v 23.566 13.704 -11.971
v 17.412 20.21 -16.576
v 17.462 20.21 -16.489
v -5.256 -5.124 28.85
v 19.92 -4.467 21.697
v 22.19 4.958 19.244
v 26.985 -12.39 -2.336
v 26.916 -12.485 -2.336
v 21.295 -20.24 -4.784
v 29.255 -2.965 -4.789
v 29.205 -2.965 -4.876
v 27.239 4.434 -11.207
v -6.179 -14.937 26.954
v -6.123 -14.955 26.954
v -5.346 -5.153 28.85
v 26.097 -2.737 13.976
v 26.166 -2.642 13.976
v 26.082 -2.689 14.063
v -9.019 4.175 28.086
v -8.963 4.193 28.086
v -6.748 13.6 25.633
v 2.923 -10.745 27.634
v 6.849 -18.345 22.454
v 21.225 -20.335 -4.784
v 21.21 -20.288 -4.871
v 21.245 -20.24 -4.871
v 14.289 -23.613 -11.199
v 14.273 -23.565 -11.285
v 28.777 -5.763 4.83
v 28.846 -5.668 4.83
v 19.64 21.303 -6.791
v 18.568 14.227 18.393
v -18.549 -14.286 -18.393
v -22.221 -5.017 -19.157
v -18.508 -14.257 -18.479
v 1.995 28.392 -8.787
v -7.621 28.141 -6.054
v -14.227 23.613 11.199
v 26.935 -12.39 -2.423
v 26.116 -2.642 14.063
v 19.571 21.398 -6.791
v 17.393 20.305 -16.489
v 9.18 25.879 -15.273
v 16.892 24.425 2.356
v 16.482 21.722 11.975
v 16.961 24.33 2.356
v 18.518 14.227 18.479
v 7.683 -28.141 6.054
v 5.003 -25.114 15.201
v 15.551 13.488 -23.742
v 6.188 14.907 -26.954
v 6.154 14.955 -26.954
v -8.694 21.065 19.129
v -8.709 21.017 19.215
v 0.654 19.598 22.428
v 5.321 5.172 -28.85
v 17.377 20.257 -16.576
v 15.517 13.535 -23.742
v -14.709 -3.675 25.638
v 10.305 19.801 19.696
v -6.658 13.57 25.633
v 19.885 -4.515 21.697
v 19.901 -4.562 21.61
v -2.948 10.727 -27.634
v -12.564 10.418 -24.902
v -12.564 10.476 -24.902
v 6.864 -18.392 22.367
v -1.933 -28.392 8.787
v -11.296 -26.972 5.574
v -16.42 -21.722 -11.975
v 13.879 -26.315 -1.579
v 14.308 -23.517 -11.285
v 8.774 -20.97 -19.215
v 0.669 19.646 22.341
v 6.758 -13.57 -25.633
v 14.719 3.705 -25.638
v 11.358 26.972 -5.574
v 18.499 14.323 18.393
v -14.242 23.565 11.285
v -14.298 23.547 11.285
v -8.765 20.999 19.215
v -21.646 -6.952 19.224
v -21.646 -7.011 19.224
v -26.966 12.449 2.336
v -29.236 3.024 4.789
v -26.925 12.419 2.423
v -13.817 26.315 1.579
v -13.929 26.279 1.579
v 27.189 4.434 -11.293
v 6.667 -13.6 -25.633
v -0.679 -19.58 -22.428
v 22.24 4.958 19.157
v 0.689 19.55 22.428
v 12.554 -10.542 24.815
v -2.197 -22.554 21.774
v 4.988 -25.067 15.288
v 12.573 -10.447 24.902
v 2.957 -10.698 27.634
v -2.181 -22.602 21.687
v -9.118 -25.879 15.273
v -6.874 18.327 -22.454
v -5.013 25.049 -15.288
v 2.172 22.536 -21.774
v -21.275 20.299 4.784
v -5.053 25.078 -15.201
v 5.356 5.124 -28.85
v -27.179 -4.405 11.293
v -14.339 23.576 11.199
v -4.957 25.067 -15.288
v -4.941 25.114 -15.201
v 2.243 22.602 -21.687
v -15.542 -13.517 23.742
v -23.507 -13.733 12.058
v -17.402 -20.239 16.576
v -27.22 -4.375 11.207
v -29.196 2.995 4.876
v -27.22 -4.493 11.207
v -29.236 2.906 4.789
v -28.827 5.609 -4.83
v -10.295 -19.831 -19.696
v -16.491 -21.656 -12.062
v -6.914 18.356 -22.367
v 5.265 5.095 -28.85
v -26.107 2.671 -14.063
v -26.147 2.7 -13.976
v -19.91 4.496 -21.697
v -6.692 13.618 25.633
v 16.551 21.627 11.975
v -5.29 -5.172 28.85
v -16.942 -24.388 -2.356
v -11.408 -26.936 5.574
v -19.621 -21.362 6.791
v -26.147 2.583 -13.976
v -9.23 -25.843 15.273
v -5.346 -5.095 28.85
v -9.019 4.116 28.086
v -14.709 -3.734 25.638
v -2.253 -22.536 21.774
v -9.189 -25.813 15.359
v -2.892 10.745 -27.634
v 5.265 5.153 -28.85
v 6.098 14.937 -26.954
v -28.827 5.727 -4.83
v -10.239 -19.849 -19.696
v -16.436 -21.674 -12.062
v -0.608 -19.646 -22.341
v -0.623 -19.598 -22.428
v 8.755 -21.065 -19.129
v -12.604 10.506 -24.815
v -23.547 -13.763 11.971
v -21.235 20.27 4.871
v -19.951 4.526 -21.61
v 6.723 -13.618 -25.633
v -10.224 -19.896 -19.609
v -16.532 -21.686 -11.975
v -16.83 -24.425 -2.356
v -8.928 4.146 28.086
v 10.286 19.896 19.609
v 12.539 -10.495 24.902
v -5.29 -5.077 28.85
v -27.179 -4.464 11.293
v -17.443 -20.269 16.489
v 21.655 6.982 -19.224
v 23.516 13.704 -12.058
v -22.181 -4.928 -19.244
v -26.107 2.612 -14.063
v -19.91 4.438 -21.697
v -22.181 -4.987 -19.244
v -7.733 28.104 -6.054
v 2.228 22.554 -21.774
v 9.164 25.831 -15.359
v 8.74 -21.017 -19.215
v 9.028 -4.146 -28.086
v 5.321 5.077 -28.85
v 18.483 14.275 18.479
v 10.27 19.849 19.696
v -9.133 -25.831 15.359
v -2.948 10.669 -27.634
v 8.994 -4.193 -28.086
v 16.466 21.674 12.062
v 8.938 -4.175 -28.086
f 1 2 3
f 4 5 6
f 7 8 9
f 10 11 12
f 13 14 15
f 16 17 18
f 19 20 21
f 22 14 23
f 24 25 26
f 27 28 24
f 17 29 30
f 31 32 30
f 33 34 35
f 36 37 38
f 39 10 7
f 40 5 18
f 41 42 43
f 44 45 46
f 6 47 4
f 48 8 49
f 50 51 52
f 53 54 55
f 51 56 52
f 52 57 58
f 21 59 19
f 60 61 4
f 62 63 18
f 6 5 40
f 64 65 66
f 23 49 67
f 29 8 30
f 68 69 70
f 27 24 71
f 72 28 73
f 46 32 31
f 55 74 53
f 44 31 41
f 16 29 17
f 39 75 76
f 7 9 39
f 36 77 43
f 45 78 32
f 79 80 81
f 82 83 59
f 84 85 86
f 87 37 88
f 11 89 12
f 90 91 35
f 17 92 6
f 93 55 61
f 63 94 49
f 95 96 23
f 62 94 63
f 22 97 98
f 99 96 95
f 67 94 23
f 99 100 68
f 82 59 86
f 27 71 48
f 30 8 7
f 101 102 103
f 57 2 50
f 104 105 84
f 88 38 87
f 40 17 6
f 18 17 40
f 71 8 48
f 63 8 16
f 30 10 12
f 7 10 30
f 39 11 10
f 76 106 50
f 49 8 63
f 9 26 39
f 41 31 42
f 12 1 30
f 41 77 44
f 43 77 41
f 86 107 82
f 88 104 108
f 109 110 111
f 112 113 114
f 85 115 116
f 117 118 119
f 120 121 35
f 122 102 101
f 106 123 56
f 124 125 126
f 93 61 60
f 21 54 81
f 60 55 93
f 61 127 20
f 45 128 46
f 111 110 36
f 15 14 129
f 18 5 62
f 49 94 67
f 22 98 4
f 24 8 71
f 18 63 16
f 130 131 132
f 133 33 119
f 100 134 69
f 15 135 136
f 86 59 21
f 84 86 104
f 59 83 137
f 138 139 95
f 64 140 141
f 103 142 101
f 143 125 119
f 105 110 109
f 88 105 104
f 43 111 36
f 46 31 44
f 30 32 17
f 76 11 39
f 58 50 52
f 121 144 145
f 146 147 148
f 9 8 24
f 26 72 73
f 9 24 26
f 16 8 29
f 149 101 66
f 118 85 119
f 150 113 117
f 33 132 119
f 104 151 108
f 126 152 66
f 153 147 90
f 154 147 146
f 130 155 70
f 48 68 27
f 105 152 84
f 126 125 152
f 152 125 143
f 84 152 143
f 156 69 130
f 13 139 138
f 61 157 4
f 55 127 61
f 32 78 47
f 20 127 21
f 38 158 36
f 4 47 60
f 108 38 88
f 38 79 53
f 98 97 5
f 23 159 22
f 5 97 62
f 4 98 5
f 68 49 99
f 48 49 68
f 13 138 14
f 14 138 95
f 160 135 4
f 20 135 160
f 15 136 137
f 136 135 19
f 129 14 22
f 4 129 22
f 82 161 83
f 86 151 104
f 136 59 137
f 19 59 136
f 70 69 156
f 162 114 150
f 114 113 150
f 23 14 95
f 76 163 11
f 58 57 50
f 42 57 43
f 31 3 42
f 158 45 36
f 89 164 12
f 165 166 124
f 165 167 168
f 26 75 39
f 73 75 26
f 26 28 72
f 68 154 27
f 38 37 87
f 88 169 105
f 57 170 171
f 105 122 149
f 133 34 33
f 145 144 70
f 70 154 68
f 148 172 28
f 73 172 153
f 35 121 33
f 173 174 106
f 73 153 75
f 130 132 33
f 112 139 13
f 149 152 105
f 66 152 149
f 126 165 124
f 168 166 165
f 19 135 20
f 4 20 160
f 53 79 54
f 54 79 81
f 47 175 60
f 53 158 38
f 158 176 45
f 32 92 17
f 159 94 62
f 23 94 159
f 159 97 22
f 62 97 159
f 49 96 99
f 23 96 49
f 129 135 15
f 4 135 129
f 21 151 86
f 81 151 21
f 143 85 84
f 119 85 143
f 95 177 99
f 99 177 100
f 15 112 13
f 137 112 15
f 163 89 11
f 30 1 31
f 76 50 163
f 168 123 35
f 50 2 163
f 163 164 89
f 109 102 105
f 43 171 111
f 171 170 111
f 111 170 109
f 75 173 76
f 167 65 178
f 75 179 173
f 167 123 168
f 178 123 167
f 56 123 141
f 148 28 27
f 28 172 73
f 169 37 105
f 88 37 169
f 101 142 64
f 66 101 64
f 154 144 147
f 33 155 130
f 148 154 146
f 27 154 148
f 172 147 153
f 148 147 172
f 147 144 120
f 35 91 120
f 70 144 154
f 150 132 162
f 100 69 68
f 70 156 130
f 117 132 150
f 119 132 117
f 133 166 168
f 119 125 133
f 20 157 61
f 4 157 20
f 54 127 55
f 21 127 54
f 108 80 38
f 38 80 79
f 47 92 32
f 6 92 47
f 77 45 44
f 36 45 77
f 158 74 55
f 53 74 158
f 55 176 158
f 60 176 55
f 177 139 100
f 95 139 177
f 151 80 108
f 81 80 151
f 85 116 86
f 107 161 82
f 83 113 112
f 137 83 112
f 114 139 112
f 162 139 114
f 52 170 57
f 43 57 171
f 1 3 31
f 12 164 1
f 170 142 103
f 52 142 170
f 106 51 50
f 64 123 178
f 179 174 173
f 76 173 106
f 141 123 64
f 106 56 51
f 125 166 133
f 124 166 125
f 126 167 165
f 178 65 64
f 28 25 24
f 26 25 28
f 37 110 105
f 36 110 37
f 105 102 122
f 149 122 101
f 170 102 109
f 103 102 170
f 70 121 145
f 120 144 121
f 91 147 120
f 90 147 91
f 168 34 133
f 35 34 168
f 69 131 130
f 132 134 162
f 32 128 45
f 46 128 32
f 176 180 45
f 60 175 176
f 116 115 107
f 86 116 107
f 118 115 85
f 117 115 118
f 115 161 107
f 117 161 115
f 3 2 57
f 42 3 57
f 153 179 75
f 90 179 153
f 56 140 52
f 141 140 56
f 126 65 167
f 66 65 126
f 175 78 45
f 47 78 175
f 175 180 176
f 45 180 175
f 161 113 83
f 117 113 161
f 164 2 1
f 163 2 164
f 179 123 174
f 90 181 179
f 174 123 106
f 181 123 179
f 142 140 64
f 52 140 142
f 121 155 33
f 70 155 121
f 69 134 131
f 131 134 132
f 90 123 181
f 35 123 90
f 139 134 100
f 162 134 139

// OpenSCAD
// Auto-generated OpenSCAD file

    inner_points = 10*[[-1.6451036775652808, -2.1626836934703126, -1.1975226886664396], [1.686072709471346, 2.432955782684813, 0.2356107715886286], [-1.6860727094713472, -2.4329557826848114, -0.2356107715886286], [1.6451036775652794, 2.1626836934703144, 1.1975226886664396], [-2.6884846067758437, 1.2389917062429145, 0.233618340039301], [-2.1194517463573437, 2.0240206487946675, 0.47842676129971456], [2.119451746357343, -2.0240206487946657, -0.47842676129971456], [2.6884846067758428, -1.2389917062429128, -0.233618340039301], [-0.2907283441631142, 1.0697947112799653, -2.7547493104508978], [-0.5305652343997654, -0.5124056576130412, 2.8763811346733195], [0.5305652343997641, 0.5124056576130432, -2.8763811346733195], [0.2907283441631129, -1.0697947112799635, 2.7547493104508978], [-1.8467649995645183, -1.4227471690324143, -1.839259902027394], [1.1327297390179003, 2.68771773847334, -0.5574263668434638], [-1.95402331758078, -2.130328684806416, 0.6790581910658857], [1.0254714210016385, 1.9801362226993382, 1.9608917262498158], [-1.0254714210016398, -1.9801362226993364, -1.9608917262498158], [1.9540233175807786, 2.130328684806418, -0.6790581910658857], [-1.1327297390179016, -2.687717738473338, 0.5574263668434638], [1.846764999564517, 1.422747169032416, 1.839259902027394], [-2.87456367211222, 0.5667833051879534, -0.4829780924069351], [-1.3848163028210105, 2.6220157589408304, 0.15793867518503008], [-2.915532704018286, 0.2965112159734543, 0.47893382467087603], [-1.425785334727077, 2.351743669726331, 1.1198505922628412], [1.4257853347270757, -2.3517436697263294, -1.1198505922628412], [2.9155327040182852, -0.2965112159734523, -0.47893382467087603], [1.3848163028210092, -2.6220157589408286, -0.15793867518503008], [2.874563672112219, -0.5667833051879514, 0.4829780924069351], [-1.2523453639028133, 1.0446987882266965, -2.48150417875951], [-0.6833125034843128, 1.8297277307784492, -2.2366957574990964], [-1.4668619999353363, -0.3704642433213059, 2.5551320074270496], [-0.8978291395168357, 0.4145646992304467, 2.799940428687463], [0.8978291395168344, -0.4145646992304447, -2.799940428687463], [1.466861999935335, 0.3704642433213079, -2.5551320074270496], [0.6833125034843115, -1.8297277307784474, 2.2366957574990964], [1.252345363902812, -1.0446987882266947, 2.48150417875951], [-2.214028904681588, -0.49577681218892655, -1.9157006080132506], [0.1964329734823296, 2.829659152765075, -0.8786754940897339], [-2.3466074769019785, -1.370395665307932, 1.197111744017687], [0.06385440126193956, 1.9550402996460696, 2.2341368579412038], [-0.06385440126194084, -1.9550402996460678, -2.2341368579412038], [2.3466074769019776, 1.3703956653079339, -1.197111744017687], [-0.19643297348233088, -2.8296591527650734, 0.8786754940897339], [2.2140289046815873, 0.49577681218892855, 1.9157006080132506], [-2.606613064002787, 0.2641562073095579, -1.3976470550614495], [-0.7651840462573698, 2.8045632297118064, -0.6054303623983461], [-2.7138713820190485, -0.44342530846444383, 1.1206710380318305], [-0.8724423642736312, 2.096981713937805, 1.9128877306949337], [0.8724423642736299, -2.096981713937803, -1.9128877306949337], [2.7138713820190477, 0.44342530846444583, -1.1206710380318305], [0.7651840462573685, -2.8045632297118046, 0.6054303623983461], [2.606613064002786, -0.2641562073095559, 1.3976470550614495], [-1.9869808074391464, 0.4467036780805339, -2.161016092644826], [-0.4972334381479373, 2.5019361318334106, -1.5200993250528605], [-2.1605284115656027, -0.6981872642529703, 1.913708176463923], [-0.6707810422743935, 1.3570451894999065, 2.554624944055888], [0.6707810422743922, -1.3570451894999047, -2.554624944055888], [2.160528411565602, 0.6981872642529723, -1.913708176463923], [0.49723343814793597, -2.501936131833409, 1.5200993250528605], [1.986980807439145, -0.4467036780805319, 2.161016092644826], [-1.5501088369047502, -1.3487833733431578, 2.36549645177391], [0.22122791204797956, 2.2506578071333787, -2.1686920260683786], [-0.22122791204798084, -2.250657807133377, 2.1686920260683786], [1.5501088369047489, 1.3487833733431596, -2.36549645177391], [-1.7361879022411257, -2.020991774398119, 1.648900019327674], [0.914894323678246, 2.578380828065043, -1.5272681951052522], [-0.9148943236782473, -2.578380828065041, 1.5272681951052522], [1.7361879022411244, 2.0209917743981207, -1.648900019327674], [-0.6138120713691793, -1.490724787634893, 2.6867455790201804], [0.6138120713691779, 1.4907247876348948, -2.6867455790201804]];

    outer_points = 10*[[-0.8127781095257554, -2.8451711072731785, 0.24903929976162134], [-0.13633829193286426, 2.9660232971458376, 0.04177473821664251], [0.13633829193286426, -2.9660232971458376, -0.04177473821664251], [0.8127781095257554, 2.8451711072731785, -0.24903929976162134], [0.7997377853601801, -0.49633525670734463, 2.816327084240848], [0.9152875010113133, 0.49633525670734463, 2.7809220703309587], [-0.9152875010113133, -0.49633525670734463, -2.7809220703309587], [-0.7997377853601801, 0.49633525670734463, -2.816327084240848], [-2.631631449063583, 0.3537405211795562, 1.329289666621699], [2.9245927429151473, -0.3537405211795562, -0.37316536491986596], [-2.9245927429151473, 0.3537405211795562, 0.37316536491986596], [2.631631449063583, -0.3537405211795562, -1.329289666621699], [-1.3984419351885988, -2.440647573398727, 0.9514341985555175], [-0.7934157692584937, 2.757042714100203, 0.7660511389790129], [1.0863770631100578, -2.757042714100203, 0.19007316272281993], [1.6914032290401628, 2.440647573398727, 0.00469010314631535], [-1.6914032290401628, -2.440647573398727, -0.00469010314631535], [-1.0863770631100578, 2.757042714100203, -0.19007316272281993], [0.7934157692584937, -2.757042714100203, -0.7660511389790129], [1.3984419351885988, 2.440647573398727, -0.9514341985555175], [0.14116788247970447, -1.2389964769384032, 2.6949187032084154], [0.443680965444757, 1.3598486668110619, 2.602227173420163], [1.090284283938324, -1.3598486668110619, 2.4041046652301516], [1.3927973669033766, 1.2389964769384032, 2.3114131354418994], [-1.3927973669033766, -1.2389964769384032, -2.3114131354418994], [-1.090284283938324, 1.3598486668110619, -2.4041046652301516], [-0.443680965444757, -1.3598486668110619, -2.602227173420163], [-0.14116788247970447, 1.2389964769384032, -2.6949187032084154], [-2.159102543778453, -0.17994011600586796, 2.030646502450221], [-2.0435528281273196, 0.8127303974088214, 1.9952414885403318], [2.8105354528188604, -0.8127303974088214, 0.5079244307848257], [2.9260851684699936, 0.17994011600586796, 0.4725194168749366], [-2.9260851684699936, -0.17994011600586796, -0.4725194168749366], [-2.8105354528188604, 0.8127303974088214, -0.5079244307848257], [2.0435528281273196, -0.8127303974088214, -1.9952414885403318], [2.159102543778453, 0.17994011600586796, -2.030646502450221], [-1.3969495096337523, -1.9069669362133024, 1.7971189803503202], [-0.9074730593547807, 2.298052837870938, 1.6471409346837047], [1.6744556840463214, -2.298052837870938, 0.8560249846414527], [2.163932134325293, 1.9069669362133024, 0.7060469389748373], [-2.163932134325293, -1.9069669362133024, -0.7060469389748373], [-1.6744556840463214, 2.298052837870938, -0.8560249846414527], [0.9074730593547807, -2.298052837870938, -1.6471409346837047], [1.3969495096337523, 1.9069669362133024, -1.7971189803503202], [-0.8088708886974889, -1.4479770599840374, 2.4630708022689527], [-0.4349441540696506, 1.764372200685514, 2.3484977705122265], [1.6759481096011677, -1.764372200685514, 1.7017097664362553], [2.049874844229006, 1.4479770599840374, 1.5871367346795289], [-2.049874844229006, -1.4479770599840374, -1.5871367346795289], [-1.6759481096011677, 1.764372200685514, -1.7017097664362553], [0.4349441540696506, -1.764372200685514, -2.3484977705122265], [0.8088708886974889, 1.4479770599840374, -2.4630708022689527], [-1.6874960082118968, -1.0434535261095852, 2.2093413993610165], [-1.384982925246844, 1.5553916176398799, 2.116649869572764], [2.3330255869267966, -1.5553916176398799, 0.9774333656738852], [2.6355386698918495, 1.0434535261095852, 0.8847418358856328], [-2.6355386698918495, -1.0434535261095852, -0.8847418358856328], [-2.3330255869267966, 1.5553916176398799, -0.9774333656738852], [1.384982925246844, -1.5553916176398799, -2.116649869572764], [1.6874960082118968, 1.0434535261095852, -2.2093413993610165], [2.645537886674456, -1.6785392291321632, 0.03553595709364332], [-2.17151655583448, 1.6785392291321632, 1.5115056605296813], [2.17151655583448, -1.6785392291321632, -1.5115056605296813], [-2.645537886674456, 1.6785392291321632, -0.03553595709364332], [1.9869679837939802, -2.4212004493632215, -0.08587242393878891], [-1.6940066899424162, 2.4212004493632215, 1.0419967256406217], [1.6940066899424162, -2.4212004493632215, -1.0419967256406217], [-1.9869679837939802, 2.4212004493632215, 0.08587242393878891], [2.759595176770743, -1.219549352902898, -0.8455538386110483], [-2.759595176770743, 1.219549352902898, 0.8455538386110483]];

    // Convex hull for inner set (I)
    module inner_hull() {
        hull() {
            for (p = inner_points) {
                translate(p) sphere(r=0.1);
            }
        }
    }

    // Convex hull for outer set (O) minus inner hull (O \ I)
    module outer_minus_inner() {
        difference() {
            hull() {
                for (p = outer_points) {
                    translate(p) sphere(r=0.1);
                }
            }
            inner_hull(); // Subtract inner hull
        }
    }

    // Convex hull for outer set (O) minus all translated inner hulls
    module outer_minus_AllTranslationInner() {
        difference() {
            hull() {
                for (p = outer_points) {
                    translate(p) sphere(r=0.1);
                }
            }
            hull() {
                translate([0,0,50]) inner_hull();
                translate([0,0,-50]) inner_hull();
            }; // Subtract translated inner hulls
        }
    }

    // Difference between outer_minus_inner and outer_minus_AllTranslationInner
    module outer_minus_inner_diff() {
        difference() {
            // Outer minus inner
            difference() {
                hull() {
                    for (p = outer_points) {
                        translate(p) sphere(r=0.1);
                    }
                }
                inner_hull();
            }

            // Subtract Outer minus AllTranslationInner
            difference() {
                hull() {
                    for (p = outer_points) {
                        translate(p) sphere(r=0.1);
                    }
                }
                hull() {
                    translate([0,0,50]) inner_hull();
                    translate([0,0,-50]) inner_hull();
                };
            }
        }
    }

    // Rendering all with colors applied
    color([1, 0, 0, 0.5]) inner_hull(); // Transparent red
    
